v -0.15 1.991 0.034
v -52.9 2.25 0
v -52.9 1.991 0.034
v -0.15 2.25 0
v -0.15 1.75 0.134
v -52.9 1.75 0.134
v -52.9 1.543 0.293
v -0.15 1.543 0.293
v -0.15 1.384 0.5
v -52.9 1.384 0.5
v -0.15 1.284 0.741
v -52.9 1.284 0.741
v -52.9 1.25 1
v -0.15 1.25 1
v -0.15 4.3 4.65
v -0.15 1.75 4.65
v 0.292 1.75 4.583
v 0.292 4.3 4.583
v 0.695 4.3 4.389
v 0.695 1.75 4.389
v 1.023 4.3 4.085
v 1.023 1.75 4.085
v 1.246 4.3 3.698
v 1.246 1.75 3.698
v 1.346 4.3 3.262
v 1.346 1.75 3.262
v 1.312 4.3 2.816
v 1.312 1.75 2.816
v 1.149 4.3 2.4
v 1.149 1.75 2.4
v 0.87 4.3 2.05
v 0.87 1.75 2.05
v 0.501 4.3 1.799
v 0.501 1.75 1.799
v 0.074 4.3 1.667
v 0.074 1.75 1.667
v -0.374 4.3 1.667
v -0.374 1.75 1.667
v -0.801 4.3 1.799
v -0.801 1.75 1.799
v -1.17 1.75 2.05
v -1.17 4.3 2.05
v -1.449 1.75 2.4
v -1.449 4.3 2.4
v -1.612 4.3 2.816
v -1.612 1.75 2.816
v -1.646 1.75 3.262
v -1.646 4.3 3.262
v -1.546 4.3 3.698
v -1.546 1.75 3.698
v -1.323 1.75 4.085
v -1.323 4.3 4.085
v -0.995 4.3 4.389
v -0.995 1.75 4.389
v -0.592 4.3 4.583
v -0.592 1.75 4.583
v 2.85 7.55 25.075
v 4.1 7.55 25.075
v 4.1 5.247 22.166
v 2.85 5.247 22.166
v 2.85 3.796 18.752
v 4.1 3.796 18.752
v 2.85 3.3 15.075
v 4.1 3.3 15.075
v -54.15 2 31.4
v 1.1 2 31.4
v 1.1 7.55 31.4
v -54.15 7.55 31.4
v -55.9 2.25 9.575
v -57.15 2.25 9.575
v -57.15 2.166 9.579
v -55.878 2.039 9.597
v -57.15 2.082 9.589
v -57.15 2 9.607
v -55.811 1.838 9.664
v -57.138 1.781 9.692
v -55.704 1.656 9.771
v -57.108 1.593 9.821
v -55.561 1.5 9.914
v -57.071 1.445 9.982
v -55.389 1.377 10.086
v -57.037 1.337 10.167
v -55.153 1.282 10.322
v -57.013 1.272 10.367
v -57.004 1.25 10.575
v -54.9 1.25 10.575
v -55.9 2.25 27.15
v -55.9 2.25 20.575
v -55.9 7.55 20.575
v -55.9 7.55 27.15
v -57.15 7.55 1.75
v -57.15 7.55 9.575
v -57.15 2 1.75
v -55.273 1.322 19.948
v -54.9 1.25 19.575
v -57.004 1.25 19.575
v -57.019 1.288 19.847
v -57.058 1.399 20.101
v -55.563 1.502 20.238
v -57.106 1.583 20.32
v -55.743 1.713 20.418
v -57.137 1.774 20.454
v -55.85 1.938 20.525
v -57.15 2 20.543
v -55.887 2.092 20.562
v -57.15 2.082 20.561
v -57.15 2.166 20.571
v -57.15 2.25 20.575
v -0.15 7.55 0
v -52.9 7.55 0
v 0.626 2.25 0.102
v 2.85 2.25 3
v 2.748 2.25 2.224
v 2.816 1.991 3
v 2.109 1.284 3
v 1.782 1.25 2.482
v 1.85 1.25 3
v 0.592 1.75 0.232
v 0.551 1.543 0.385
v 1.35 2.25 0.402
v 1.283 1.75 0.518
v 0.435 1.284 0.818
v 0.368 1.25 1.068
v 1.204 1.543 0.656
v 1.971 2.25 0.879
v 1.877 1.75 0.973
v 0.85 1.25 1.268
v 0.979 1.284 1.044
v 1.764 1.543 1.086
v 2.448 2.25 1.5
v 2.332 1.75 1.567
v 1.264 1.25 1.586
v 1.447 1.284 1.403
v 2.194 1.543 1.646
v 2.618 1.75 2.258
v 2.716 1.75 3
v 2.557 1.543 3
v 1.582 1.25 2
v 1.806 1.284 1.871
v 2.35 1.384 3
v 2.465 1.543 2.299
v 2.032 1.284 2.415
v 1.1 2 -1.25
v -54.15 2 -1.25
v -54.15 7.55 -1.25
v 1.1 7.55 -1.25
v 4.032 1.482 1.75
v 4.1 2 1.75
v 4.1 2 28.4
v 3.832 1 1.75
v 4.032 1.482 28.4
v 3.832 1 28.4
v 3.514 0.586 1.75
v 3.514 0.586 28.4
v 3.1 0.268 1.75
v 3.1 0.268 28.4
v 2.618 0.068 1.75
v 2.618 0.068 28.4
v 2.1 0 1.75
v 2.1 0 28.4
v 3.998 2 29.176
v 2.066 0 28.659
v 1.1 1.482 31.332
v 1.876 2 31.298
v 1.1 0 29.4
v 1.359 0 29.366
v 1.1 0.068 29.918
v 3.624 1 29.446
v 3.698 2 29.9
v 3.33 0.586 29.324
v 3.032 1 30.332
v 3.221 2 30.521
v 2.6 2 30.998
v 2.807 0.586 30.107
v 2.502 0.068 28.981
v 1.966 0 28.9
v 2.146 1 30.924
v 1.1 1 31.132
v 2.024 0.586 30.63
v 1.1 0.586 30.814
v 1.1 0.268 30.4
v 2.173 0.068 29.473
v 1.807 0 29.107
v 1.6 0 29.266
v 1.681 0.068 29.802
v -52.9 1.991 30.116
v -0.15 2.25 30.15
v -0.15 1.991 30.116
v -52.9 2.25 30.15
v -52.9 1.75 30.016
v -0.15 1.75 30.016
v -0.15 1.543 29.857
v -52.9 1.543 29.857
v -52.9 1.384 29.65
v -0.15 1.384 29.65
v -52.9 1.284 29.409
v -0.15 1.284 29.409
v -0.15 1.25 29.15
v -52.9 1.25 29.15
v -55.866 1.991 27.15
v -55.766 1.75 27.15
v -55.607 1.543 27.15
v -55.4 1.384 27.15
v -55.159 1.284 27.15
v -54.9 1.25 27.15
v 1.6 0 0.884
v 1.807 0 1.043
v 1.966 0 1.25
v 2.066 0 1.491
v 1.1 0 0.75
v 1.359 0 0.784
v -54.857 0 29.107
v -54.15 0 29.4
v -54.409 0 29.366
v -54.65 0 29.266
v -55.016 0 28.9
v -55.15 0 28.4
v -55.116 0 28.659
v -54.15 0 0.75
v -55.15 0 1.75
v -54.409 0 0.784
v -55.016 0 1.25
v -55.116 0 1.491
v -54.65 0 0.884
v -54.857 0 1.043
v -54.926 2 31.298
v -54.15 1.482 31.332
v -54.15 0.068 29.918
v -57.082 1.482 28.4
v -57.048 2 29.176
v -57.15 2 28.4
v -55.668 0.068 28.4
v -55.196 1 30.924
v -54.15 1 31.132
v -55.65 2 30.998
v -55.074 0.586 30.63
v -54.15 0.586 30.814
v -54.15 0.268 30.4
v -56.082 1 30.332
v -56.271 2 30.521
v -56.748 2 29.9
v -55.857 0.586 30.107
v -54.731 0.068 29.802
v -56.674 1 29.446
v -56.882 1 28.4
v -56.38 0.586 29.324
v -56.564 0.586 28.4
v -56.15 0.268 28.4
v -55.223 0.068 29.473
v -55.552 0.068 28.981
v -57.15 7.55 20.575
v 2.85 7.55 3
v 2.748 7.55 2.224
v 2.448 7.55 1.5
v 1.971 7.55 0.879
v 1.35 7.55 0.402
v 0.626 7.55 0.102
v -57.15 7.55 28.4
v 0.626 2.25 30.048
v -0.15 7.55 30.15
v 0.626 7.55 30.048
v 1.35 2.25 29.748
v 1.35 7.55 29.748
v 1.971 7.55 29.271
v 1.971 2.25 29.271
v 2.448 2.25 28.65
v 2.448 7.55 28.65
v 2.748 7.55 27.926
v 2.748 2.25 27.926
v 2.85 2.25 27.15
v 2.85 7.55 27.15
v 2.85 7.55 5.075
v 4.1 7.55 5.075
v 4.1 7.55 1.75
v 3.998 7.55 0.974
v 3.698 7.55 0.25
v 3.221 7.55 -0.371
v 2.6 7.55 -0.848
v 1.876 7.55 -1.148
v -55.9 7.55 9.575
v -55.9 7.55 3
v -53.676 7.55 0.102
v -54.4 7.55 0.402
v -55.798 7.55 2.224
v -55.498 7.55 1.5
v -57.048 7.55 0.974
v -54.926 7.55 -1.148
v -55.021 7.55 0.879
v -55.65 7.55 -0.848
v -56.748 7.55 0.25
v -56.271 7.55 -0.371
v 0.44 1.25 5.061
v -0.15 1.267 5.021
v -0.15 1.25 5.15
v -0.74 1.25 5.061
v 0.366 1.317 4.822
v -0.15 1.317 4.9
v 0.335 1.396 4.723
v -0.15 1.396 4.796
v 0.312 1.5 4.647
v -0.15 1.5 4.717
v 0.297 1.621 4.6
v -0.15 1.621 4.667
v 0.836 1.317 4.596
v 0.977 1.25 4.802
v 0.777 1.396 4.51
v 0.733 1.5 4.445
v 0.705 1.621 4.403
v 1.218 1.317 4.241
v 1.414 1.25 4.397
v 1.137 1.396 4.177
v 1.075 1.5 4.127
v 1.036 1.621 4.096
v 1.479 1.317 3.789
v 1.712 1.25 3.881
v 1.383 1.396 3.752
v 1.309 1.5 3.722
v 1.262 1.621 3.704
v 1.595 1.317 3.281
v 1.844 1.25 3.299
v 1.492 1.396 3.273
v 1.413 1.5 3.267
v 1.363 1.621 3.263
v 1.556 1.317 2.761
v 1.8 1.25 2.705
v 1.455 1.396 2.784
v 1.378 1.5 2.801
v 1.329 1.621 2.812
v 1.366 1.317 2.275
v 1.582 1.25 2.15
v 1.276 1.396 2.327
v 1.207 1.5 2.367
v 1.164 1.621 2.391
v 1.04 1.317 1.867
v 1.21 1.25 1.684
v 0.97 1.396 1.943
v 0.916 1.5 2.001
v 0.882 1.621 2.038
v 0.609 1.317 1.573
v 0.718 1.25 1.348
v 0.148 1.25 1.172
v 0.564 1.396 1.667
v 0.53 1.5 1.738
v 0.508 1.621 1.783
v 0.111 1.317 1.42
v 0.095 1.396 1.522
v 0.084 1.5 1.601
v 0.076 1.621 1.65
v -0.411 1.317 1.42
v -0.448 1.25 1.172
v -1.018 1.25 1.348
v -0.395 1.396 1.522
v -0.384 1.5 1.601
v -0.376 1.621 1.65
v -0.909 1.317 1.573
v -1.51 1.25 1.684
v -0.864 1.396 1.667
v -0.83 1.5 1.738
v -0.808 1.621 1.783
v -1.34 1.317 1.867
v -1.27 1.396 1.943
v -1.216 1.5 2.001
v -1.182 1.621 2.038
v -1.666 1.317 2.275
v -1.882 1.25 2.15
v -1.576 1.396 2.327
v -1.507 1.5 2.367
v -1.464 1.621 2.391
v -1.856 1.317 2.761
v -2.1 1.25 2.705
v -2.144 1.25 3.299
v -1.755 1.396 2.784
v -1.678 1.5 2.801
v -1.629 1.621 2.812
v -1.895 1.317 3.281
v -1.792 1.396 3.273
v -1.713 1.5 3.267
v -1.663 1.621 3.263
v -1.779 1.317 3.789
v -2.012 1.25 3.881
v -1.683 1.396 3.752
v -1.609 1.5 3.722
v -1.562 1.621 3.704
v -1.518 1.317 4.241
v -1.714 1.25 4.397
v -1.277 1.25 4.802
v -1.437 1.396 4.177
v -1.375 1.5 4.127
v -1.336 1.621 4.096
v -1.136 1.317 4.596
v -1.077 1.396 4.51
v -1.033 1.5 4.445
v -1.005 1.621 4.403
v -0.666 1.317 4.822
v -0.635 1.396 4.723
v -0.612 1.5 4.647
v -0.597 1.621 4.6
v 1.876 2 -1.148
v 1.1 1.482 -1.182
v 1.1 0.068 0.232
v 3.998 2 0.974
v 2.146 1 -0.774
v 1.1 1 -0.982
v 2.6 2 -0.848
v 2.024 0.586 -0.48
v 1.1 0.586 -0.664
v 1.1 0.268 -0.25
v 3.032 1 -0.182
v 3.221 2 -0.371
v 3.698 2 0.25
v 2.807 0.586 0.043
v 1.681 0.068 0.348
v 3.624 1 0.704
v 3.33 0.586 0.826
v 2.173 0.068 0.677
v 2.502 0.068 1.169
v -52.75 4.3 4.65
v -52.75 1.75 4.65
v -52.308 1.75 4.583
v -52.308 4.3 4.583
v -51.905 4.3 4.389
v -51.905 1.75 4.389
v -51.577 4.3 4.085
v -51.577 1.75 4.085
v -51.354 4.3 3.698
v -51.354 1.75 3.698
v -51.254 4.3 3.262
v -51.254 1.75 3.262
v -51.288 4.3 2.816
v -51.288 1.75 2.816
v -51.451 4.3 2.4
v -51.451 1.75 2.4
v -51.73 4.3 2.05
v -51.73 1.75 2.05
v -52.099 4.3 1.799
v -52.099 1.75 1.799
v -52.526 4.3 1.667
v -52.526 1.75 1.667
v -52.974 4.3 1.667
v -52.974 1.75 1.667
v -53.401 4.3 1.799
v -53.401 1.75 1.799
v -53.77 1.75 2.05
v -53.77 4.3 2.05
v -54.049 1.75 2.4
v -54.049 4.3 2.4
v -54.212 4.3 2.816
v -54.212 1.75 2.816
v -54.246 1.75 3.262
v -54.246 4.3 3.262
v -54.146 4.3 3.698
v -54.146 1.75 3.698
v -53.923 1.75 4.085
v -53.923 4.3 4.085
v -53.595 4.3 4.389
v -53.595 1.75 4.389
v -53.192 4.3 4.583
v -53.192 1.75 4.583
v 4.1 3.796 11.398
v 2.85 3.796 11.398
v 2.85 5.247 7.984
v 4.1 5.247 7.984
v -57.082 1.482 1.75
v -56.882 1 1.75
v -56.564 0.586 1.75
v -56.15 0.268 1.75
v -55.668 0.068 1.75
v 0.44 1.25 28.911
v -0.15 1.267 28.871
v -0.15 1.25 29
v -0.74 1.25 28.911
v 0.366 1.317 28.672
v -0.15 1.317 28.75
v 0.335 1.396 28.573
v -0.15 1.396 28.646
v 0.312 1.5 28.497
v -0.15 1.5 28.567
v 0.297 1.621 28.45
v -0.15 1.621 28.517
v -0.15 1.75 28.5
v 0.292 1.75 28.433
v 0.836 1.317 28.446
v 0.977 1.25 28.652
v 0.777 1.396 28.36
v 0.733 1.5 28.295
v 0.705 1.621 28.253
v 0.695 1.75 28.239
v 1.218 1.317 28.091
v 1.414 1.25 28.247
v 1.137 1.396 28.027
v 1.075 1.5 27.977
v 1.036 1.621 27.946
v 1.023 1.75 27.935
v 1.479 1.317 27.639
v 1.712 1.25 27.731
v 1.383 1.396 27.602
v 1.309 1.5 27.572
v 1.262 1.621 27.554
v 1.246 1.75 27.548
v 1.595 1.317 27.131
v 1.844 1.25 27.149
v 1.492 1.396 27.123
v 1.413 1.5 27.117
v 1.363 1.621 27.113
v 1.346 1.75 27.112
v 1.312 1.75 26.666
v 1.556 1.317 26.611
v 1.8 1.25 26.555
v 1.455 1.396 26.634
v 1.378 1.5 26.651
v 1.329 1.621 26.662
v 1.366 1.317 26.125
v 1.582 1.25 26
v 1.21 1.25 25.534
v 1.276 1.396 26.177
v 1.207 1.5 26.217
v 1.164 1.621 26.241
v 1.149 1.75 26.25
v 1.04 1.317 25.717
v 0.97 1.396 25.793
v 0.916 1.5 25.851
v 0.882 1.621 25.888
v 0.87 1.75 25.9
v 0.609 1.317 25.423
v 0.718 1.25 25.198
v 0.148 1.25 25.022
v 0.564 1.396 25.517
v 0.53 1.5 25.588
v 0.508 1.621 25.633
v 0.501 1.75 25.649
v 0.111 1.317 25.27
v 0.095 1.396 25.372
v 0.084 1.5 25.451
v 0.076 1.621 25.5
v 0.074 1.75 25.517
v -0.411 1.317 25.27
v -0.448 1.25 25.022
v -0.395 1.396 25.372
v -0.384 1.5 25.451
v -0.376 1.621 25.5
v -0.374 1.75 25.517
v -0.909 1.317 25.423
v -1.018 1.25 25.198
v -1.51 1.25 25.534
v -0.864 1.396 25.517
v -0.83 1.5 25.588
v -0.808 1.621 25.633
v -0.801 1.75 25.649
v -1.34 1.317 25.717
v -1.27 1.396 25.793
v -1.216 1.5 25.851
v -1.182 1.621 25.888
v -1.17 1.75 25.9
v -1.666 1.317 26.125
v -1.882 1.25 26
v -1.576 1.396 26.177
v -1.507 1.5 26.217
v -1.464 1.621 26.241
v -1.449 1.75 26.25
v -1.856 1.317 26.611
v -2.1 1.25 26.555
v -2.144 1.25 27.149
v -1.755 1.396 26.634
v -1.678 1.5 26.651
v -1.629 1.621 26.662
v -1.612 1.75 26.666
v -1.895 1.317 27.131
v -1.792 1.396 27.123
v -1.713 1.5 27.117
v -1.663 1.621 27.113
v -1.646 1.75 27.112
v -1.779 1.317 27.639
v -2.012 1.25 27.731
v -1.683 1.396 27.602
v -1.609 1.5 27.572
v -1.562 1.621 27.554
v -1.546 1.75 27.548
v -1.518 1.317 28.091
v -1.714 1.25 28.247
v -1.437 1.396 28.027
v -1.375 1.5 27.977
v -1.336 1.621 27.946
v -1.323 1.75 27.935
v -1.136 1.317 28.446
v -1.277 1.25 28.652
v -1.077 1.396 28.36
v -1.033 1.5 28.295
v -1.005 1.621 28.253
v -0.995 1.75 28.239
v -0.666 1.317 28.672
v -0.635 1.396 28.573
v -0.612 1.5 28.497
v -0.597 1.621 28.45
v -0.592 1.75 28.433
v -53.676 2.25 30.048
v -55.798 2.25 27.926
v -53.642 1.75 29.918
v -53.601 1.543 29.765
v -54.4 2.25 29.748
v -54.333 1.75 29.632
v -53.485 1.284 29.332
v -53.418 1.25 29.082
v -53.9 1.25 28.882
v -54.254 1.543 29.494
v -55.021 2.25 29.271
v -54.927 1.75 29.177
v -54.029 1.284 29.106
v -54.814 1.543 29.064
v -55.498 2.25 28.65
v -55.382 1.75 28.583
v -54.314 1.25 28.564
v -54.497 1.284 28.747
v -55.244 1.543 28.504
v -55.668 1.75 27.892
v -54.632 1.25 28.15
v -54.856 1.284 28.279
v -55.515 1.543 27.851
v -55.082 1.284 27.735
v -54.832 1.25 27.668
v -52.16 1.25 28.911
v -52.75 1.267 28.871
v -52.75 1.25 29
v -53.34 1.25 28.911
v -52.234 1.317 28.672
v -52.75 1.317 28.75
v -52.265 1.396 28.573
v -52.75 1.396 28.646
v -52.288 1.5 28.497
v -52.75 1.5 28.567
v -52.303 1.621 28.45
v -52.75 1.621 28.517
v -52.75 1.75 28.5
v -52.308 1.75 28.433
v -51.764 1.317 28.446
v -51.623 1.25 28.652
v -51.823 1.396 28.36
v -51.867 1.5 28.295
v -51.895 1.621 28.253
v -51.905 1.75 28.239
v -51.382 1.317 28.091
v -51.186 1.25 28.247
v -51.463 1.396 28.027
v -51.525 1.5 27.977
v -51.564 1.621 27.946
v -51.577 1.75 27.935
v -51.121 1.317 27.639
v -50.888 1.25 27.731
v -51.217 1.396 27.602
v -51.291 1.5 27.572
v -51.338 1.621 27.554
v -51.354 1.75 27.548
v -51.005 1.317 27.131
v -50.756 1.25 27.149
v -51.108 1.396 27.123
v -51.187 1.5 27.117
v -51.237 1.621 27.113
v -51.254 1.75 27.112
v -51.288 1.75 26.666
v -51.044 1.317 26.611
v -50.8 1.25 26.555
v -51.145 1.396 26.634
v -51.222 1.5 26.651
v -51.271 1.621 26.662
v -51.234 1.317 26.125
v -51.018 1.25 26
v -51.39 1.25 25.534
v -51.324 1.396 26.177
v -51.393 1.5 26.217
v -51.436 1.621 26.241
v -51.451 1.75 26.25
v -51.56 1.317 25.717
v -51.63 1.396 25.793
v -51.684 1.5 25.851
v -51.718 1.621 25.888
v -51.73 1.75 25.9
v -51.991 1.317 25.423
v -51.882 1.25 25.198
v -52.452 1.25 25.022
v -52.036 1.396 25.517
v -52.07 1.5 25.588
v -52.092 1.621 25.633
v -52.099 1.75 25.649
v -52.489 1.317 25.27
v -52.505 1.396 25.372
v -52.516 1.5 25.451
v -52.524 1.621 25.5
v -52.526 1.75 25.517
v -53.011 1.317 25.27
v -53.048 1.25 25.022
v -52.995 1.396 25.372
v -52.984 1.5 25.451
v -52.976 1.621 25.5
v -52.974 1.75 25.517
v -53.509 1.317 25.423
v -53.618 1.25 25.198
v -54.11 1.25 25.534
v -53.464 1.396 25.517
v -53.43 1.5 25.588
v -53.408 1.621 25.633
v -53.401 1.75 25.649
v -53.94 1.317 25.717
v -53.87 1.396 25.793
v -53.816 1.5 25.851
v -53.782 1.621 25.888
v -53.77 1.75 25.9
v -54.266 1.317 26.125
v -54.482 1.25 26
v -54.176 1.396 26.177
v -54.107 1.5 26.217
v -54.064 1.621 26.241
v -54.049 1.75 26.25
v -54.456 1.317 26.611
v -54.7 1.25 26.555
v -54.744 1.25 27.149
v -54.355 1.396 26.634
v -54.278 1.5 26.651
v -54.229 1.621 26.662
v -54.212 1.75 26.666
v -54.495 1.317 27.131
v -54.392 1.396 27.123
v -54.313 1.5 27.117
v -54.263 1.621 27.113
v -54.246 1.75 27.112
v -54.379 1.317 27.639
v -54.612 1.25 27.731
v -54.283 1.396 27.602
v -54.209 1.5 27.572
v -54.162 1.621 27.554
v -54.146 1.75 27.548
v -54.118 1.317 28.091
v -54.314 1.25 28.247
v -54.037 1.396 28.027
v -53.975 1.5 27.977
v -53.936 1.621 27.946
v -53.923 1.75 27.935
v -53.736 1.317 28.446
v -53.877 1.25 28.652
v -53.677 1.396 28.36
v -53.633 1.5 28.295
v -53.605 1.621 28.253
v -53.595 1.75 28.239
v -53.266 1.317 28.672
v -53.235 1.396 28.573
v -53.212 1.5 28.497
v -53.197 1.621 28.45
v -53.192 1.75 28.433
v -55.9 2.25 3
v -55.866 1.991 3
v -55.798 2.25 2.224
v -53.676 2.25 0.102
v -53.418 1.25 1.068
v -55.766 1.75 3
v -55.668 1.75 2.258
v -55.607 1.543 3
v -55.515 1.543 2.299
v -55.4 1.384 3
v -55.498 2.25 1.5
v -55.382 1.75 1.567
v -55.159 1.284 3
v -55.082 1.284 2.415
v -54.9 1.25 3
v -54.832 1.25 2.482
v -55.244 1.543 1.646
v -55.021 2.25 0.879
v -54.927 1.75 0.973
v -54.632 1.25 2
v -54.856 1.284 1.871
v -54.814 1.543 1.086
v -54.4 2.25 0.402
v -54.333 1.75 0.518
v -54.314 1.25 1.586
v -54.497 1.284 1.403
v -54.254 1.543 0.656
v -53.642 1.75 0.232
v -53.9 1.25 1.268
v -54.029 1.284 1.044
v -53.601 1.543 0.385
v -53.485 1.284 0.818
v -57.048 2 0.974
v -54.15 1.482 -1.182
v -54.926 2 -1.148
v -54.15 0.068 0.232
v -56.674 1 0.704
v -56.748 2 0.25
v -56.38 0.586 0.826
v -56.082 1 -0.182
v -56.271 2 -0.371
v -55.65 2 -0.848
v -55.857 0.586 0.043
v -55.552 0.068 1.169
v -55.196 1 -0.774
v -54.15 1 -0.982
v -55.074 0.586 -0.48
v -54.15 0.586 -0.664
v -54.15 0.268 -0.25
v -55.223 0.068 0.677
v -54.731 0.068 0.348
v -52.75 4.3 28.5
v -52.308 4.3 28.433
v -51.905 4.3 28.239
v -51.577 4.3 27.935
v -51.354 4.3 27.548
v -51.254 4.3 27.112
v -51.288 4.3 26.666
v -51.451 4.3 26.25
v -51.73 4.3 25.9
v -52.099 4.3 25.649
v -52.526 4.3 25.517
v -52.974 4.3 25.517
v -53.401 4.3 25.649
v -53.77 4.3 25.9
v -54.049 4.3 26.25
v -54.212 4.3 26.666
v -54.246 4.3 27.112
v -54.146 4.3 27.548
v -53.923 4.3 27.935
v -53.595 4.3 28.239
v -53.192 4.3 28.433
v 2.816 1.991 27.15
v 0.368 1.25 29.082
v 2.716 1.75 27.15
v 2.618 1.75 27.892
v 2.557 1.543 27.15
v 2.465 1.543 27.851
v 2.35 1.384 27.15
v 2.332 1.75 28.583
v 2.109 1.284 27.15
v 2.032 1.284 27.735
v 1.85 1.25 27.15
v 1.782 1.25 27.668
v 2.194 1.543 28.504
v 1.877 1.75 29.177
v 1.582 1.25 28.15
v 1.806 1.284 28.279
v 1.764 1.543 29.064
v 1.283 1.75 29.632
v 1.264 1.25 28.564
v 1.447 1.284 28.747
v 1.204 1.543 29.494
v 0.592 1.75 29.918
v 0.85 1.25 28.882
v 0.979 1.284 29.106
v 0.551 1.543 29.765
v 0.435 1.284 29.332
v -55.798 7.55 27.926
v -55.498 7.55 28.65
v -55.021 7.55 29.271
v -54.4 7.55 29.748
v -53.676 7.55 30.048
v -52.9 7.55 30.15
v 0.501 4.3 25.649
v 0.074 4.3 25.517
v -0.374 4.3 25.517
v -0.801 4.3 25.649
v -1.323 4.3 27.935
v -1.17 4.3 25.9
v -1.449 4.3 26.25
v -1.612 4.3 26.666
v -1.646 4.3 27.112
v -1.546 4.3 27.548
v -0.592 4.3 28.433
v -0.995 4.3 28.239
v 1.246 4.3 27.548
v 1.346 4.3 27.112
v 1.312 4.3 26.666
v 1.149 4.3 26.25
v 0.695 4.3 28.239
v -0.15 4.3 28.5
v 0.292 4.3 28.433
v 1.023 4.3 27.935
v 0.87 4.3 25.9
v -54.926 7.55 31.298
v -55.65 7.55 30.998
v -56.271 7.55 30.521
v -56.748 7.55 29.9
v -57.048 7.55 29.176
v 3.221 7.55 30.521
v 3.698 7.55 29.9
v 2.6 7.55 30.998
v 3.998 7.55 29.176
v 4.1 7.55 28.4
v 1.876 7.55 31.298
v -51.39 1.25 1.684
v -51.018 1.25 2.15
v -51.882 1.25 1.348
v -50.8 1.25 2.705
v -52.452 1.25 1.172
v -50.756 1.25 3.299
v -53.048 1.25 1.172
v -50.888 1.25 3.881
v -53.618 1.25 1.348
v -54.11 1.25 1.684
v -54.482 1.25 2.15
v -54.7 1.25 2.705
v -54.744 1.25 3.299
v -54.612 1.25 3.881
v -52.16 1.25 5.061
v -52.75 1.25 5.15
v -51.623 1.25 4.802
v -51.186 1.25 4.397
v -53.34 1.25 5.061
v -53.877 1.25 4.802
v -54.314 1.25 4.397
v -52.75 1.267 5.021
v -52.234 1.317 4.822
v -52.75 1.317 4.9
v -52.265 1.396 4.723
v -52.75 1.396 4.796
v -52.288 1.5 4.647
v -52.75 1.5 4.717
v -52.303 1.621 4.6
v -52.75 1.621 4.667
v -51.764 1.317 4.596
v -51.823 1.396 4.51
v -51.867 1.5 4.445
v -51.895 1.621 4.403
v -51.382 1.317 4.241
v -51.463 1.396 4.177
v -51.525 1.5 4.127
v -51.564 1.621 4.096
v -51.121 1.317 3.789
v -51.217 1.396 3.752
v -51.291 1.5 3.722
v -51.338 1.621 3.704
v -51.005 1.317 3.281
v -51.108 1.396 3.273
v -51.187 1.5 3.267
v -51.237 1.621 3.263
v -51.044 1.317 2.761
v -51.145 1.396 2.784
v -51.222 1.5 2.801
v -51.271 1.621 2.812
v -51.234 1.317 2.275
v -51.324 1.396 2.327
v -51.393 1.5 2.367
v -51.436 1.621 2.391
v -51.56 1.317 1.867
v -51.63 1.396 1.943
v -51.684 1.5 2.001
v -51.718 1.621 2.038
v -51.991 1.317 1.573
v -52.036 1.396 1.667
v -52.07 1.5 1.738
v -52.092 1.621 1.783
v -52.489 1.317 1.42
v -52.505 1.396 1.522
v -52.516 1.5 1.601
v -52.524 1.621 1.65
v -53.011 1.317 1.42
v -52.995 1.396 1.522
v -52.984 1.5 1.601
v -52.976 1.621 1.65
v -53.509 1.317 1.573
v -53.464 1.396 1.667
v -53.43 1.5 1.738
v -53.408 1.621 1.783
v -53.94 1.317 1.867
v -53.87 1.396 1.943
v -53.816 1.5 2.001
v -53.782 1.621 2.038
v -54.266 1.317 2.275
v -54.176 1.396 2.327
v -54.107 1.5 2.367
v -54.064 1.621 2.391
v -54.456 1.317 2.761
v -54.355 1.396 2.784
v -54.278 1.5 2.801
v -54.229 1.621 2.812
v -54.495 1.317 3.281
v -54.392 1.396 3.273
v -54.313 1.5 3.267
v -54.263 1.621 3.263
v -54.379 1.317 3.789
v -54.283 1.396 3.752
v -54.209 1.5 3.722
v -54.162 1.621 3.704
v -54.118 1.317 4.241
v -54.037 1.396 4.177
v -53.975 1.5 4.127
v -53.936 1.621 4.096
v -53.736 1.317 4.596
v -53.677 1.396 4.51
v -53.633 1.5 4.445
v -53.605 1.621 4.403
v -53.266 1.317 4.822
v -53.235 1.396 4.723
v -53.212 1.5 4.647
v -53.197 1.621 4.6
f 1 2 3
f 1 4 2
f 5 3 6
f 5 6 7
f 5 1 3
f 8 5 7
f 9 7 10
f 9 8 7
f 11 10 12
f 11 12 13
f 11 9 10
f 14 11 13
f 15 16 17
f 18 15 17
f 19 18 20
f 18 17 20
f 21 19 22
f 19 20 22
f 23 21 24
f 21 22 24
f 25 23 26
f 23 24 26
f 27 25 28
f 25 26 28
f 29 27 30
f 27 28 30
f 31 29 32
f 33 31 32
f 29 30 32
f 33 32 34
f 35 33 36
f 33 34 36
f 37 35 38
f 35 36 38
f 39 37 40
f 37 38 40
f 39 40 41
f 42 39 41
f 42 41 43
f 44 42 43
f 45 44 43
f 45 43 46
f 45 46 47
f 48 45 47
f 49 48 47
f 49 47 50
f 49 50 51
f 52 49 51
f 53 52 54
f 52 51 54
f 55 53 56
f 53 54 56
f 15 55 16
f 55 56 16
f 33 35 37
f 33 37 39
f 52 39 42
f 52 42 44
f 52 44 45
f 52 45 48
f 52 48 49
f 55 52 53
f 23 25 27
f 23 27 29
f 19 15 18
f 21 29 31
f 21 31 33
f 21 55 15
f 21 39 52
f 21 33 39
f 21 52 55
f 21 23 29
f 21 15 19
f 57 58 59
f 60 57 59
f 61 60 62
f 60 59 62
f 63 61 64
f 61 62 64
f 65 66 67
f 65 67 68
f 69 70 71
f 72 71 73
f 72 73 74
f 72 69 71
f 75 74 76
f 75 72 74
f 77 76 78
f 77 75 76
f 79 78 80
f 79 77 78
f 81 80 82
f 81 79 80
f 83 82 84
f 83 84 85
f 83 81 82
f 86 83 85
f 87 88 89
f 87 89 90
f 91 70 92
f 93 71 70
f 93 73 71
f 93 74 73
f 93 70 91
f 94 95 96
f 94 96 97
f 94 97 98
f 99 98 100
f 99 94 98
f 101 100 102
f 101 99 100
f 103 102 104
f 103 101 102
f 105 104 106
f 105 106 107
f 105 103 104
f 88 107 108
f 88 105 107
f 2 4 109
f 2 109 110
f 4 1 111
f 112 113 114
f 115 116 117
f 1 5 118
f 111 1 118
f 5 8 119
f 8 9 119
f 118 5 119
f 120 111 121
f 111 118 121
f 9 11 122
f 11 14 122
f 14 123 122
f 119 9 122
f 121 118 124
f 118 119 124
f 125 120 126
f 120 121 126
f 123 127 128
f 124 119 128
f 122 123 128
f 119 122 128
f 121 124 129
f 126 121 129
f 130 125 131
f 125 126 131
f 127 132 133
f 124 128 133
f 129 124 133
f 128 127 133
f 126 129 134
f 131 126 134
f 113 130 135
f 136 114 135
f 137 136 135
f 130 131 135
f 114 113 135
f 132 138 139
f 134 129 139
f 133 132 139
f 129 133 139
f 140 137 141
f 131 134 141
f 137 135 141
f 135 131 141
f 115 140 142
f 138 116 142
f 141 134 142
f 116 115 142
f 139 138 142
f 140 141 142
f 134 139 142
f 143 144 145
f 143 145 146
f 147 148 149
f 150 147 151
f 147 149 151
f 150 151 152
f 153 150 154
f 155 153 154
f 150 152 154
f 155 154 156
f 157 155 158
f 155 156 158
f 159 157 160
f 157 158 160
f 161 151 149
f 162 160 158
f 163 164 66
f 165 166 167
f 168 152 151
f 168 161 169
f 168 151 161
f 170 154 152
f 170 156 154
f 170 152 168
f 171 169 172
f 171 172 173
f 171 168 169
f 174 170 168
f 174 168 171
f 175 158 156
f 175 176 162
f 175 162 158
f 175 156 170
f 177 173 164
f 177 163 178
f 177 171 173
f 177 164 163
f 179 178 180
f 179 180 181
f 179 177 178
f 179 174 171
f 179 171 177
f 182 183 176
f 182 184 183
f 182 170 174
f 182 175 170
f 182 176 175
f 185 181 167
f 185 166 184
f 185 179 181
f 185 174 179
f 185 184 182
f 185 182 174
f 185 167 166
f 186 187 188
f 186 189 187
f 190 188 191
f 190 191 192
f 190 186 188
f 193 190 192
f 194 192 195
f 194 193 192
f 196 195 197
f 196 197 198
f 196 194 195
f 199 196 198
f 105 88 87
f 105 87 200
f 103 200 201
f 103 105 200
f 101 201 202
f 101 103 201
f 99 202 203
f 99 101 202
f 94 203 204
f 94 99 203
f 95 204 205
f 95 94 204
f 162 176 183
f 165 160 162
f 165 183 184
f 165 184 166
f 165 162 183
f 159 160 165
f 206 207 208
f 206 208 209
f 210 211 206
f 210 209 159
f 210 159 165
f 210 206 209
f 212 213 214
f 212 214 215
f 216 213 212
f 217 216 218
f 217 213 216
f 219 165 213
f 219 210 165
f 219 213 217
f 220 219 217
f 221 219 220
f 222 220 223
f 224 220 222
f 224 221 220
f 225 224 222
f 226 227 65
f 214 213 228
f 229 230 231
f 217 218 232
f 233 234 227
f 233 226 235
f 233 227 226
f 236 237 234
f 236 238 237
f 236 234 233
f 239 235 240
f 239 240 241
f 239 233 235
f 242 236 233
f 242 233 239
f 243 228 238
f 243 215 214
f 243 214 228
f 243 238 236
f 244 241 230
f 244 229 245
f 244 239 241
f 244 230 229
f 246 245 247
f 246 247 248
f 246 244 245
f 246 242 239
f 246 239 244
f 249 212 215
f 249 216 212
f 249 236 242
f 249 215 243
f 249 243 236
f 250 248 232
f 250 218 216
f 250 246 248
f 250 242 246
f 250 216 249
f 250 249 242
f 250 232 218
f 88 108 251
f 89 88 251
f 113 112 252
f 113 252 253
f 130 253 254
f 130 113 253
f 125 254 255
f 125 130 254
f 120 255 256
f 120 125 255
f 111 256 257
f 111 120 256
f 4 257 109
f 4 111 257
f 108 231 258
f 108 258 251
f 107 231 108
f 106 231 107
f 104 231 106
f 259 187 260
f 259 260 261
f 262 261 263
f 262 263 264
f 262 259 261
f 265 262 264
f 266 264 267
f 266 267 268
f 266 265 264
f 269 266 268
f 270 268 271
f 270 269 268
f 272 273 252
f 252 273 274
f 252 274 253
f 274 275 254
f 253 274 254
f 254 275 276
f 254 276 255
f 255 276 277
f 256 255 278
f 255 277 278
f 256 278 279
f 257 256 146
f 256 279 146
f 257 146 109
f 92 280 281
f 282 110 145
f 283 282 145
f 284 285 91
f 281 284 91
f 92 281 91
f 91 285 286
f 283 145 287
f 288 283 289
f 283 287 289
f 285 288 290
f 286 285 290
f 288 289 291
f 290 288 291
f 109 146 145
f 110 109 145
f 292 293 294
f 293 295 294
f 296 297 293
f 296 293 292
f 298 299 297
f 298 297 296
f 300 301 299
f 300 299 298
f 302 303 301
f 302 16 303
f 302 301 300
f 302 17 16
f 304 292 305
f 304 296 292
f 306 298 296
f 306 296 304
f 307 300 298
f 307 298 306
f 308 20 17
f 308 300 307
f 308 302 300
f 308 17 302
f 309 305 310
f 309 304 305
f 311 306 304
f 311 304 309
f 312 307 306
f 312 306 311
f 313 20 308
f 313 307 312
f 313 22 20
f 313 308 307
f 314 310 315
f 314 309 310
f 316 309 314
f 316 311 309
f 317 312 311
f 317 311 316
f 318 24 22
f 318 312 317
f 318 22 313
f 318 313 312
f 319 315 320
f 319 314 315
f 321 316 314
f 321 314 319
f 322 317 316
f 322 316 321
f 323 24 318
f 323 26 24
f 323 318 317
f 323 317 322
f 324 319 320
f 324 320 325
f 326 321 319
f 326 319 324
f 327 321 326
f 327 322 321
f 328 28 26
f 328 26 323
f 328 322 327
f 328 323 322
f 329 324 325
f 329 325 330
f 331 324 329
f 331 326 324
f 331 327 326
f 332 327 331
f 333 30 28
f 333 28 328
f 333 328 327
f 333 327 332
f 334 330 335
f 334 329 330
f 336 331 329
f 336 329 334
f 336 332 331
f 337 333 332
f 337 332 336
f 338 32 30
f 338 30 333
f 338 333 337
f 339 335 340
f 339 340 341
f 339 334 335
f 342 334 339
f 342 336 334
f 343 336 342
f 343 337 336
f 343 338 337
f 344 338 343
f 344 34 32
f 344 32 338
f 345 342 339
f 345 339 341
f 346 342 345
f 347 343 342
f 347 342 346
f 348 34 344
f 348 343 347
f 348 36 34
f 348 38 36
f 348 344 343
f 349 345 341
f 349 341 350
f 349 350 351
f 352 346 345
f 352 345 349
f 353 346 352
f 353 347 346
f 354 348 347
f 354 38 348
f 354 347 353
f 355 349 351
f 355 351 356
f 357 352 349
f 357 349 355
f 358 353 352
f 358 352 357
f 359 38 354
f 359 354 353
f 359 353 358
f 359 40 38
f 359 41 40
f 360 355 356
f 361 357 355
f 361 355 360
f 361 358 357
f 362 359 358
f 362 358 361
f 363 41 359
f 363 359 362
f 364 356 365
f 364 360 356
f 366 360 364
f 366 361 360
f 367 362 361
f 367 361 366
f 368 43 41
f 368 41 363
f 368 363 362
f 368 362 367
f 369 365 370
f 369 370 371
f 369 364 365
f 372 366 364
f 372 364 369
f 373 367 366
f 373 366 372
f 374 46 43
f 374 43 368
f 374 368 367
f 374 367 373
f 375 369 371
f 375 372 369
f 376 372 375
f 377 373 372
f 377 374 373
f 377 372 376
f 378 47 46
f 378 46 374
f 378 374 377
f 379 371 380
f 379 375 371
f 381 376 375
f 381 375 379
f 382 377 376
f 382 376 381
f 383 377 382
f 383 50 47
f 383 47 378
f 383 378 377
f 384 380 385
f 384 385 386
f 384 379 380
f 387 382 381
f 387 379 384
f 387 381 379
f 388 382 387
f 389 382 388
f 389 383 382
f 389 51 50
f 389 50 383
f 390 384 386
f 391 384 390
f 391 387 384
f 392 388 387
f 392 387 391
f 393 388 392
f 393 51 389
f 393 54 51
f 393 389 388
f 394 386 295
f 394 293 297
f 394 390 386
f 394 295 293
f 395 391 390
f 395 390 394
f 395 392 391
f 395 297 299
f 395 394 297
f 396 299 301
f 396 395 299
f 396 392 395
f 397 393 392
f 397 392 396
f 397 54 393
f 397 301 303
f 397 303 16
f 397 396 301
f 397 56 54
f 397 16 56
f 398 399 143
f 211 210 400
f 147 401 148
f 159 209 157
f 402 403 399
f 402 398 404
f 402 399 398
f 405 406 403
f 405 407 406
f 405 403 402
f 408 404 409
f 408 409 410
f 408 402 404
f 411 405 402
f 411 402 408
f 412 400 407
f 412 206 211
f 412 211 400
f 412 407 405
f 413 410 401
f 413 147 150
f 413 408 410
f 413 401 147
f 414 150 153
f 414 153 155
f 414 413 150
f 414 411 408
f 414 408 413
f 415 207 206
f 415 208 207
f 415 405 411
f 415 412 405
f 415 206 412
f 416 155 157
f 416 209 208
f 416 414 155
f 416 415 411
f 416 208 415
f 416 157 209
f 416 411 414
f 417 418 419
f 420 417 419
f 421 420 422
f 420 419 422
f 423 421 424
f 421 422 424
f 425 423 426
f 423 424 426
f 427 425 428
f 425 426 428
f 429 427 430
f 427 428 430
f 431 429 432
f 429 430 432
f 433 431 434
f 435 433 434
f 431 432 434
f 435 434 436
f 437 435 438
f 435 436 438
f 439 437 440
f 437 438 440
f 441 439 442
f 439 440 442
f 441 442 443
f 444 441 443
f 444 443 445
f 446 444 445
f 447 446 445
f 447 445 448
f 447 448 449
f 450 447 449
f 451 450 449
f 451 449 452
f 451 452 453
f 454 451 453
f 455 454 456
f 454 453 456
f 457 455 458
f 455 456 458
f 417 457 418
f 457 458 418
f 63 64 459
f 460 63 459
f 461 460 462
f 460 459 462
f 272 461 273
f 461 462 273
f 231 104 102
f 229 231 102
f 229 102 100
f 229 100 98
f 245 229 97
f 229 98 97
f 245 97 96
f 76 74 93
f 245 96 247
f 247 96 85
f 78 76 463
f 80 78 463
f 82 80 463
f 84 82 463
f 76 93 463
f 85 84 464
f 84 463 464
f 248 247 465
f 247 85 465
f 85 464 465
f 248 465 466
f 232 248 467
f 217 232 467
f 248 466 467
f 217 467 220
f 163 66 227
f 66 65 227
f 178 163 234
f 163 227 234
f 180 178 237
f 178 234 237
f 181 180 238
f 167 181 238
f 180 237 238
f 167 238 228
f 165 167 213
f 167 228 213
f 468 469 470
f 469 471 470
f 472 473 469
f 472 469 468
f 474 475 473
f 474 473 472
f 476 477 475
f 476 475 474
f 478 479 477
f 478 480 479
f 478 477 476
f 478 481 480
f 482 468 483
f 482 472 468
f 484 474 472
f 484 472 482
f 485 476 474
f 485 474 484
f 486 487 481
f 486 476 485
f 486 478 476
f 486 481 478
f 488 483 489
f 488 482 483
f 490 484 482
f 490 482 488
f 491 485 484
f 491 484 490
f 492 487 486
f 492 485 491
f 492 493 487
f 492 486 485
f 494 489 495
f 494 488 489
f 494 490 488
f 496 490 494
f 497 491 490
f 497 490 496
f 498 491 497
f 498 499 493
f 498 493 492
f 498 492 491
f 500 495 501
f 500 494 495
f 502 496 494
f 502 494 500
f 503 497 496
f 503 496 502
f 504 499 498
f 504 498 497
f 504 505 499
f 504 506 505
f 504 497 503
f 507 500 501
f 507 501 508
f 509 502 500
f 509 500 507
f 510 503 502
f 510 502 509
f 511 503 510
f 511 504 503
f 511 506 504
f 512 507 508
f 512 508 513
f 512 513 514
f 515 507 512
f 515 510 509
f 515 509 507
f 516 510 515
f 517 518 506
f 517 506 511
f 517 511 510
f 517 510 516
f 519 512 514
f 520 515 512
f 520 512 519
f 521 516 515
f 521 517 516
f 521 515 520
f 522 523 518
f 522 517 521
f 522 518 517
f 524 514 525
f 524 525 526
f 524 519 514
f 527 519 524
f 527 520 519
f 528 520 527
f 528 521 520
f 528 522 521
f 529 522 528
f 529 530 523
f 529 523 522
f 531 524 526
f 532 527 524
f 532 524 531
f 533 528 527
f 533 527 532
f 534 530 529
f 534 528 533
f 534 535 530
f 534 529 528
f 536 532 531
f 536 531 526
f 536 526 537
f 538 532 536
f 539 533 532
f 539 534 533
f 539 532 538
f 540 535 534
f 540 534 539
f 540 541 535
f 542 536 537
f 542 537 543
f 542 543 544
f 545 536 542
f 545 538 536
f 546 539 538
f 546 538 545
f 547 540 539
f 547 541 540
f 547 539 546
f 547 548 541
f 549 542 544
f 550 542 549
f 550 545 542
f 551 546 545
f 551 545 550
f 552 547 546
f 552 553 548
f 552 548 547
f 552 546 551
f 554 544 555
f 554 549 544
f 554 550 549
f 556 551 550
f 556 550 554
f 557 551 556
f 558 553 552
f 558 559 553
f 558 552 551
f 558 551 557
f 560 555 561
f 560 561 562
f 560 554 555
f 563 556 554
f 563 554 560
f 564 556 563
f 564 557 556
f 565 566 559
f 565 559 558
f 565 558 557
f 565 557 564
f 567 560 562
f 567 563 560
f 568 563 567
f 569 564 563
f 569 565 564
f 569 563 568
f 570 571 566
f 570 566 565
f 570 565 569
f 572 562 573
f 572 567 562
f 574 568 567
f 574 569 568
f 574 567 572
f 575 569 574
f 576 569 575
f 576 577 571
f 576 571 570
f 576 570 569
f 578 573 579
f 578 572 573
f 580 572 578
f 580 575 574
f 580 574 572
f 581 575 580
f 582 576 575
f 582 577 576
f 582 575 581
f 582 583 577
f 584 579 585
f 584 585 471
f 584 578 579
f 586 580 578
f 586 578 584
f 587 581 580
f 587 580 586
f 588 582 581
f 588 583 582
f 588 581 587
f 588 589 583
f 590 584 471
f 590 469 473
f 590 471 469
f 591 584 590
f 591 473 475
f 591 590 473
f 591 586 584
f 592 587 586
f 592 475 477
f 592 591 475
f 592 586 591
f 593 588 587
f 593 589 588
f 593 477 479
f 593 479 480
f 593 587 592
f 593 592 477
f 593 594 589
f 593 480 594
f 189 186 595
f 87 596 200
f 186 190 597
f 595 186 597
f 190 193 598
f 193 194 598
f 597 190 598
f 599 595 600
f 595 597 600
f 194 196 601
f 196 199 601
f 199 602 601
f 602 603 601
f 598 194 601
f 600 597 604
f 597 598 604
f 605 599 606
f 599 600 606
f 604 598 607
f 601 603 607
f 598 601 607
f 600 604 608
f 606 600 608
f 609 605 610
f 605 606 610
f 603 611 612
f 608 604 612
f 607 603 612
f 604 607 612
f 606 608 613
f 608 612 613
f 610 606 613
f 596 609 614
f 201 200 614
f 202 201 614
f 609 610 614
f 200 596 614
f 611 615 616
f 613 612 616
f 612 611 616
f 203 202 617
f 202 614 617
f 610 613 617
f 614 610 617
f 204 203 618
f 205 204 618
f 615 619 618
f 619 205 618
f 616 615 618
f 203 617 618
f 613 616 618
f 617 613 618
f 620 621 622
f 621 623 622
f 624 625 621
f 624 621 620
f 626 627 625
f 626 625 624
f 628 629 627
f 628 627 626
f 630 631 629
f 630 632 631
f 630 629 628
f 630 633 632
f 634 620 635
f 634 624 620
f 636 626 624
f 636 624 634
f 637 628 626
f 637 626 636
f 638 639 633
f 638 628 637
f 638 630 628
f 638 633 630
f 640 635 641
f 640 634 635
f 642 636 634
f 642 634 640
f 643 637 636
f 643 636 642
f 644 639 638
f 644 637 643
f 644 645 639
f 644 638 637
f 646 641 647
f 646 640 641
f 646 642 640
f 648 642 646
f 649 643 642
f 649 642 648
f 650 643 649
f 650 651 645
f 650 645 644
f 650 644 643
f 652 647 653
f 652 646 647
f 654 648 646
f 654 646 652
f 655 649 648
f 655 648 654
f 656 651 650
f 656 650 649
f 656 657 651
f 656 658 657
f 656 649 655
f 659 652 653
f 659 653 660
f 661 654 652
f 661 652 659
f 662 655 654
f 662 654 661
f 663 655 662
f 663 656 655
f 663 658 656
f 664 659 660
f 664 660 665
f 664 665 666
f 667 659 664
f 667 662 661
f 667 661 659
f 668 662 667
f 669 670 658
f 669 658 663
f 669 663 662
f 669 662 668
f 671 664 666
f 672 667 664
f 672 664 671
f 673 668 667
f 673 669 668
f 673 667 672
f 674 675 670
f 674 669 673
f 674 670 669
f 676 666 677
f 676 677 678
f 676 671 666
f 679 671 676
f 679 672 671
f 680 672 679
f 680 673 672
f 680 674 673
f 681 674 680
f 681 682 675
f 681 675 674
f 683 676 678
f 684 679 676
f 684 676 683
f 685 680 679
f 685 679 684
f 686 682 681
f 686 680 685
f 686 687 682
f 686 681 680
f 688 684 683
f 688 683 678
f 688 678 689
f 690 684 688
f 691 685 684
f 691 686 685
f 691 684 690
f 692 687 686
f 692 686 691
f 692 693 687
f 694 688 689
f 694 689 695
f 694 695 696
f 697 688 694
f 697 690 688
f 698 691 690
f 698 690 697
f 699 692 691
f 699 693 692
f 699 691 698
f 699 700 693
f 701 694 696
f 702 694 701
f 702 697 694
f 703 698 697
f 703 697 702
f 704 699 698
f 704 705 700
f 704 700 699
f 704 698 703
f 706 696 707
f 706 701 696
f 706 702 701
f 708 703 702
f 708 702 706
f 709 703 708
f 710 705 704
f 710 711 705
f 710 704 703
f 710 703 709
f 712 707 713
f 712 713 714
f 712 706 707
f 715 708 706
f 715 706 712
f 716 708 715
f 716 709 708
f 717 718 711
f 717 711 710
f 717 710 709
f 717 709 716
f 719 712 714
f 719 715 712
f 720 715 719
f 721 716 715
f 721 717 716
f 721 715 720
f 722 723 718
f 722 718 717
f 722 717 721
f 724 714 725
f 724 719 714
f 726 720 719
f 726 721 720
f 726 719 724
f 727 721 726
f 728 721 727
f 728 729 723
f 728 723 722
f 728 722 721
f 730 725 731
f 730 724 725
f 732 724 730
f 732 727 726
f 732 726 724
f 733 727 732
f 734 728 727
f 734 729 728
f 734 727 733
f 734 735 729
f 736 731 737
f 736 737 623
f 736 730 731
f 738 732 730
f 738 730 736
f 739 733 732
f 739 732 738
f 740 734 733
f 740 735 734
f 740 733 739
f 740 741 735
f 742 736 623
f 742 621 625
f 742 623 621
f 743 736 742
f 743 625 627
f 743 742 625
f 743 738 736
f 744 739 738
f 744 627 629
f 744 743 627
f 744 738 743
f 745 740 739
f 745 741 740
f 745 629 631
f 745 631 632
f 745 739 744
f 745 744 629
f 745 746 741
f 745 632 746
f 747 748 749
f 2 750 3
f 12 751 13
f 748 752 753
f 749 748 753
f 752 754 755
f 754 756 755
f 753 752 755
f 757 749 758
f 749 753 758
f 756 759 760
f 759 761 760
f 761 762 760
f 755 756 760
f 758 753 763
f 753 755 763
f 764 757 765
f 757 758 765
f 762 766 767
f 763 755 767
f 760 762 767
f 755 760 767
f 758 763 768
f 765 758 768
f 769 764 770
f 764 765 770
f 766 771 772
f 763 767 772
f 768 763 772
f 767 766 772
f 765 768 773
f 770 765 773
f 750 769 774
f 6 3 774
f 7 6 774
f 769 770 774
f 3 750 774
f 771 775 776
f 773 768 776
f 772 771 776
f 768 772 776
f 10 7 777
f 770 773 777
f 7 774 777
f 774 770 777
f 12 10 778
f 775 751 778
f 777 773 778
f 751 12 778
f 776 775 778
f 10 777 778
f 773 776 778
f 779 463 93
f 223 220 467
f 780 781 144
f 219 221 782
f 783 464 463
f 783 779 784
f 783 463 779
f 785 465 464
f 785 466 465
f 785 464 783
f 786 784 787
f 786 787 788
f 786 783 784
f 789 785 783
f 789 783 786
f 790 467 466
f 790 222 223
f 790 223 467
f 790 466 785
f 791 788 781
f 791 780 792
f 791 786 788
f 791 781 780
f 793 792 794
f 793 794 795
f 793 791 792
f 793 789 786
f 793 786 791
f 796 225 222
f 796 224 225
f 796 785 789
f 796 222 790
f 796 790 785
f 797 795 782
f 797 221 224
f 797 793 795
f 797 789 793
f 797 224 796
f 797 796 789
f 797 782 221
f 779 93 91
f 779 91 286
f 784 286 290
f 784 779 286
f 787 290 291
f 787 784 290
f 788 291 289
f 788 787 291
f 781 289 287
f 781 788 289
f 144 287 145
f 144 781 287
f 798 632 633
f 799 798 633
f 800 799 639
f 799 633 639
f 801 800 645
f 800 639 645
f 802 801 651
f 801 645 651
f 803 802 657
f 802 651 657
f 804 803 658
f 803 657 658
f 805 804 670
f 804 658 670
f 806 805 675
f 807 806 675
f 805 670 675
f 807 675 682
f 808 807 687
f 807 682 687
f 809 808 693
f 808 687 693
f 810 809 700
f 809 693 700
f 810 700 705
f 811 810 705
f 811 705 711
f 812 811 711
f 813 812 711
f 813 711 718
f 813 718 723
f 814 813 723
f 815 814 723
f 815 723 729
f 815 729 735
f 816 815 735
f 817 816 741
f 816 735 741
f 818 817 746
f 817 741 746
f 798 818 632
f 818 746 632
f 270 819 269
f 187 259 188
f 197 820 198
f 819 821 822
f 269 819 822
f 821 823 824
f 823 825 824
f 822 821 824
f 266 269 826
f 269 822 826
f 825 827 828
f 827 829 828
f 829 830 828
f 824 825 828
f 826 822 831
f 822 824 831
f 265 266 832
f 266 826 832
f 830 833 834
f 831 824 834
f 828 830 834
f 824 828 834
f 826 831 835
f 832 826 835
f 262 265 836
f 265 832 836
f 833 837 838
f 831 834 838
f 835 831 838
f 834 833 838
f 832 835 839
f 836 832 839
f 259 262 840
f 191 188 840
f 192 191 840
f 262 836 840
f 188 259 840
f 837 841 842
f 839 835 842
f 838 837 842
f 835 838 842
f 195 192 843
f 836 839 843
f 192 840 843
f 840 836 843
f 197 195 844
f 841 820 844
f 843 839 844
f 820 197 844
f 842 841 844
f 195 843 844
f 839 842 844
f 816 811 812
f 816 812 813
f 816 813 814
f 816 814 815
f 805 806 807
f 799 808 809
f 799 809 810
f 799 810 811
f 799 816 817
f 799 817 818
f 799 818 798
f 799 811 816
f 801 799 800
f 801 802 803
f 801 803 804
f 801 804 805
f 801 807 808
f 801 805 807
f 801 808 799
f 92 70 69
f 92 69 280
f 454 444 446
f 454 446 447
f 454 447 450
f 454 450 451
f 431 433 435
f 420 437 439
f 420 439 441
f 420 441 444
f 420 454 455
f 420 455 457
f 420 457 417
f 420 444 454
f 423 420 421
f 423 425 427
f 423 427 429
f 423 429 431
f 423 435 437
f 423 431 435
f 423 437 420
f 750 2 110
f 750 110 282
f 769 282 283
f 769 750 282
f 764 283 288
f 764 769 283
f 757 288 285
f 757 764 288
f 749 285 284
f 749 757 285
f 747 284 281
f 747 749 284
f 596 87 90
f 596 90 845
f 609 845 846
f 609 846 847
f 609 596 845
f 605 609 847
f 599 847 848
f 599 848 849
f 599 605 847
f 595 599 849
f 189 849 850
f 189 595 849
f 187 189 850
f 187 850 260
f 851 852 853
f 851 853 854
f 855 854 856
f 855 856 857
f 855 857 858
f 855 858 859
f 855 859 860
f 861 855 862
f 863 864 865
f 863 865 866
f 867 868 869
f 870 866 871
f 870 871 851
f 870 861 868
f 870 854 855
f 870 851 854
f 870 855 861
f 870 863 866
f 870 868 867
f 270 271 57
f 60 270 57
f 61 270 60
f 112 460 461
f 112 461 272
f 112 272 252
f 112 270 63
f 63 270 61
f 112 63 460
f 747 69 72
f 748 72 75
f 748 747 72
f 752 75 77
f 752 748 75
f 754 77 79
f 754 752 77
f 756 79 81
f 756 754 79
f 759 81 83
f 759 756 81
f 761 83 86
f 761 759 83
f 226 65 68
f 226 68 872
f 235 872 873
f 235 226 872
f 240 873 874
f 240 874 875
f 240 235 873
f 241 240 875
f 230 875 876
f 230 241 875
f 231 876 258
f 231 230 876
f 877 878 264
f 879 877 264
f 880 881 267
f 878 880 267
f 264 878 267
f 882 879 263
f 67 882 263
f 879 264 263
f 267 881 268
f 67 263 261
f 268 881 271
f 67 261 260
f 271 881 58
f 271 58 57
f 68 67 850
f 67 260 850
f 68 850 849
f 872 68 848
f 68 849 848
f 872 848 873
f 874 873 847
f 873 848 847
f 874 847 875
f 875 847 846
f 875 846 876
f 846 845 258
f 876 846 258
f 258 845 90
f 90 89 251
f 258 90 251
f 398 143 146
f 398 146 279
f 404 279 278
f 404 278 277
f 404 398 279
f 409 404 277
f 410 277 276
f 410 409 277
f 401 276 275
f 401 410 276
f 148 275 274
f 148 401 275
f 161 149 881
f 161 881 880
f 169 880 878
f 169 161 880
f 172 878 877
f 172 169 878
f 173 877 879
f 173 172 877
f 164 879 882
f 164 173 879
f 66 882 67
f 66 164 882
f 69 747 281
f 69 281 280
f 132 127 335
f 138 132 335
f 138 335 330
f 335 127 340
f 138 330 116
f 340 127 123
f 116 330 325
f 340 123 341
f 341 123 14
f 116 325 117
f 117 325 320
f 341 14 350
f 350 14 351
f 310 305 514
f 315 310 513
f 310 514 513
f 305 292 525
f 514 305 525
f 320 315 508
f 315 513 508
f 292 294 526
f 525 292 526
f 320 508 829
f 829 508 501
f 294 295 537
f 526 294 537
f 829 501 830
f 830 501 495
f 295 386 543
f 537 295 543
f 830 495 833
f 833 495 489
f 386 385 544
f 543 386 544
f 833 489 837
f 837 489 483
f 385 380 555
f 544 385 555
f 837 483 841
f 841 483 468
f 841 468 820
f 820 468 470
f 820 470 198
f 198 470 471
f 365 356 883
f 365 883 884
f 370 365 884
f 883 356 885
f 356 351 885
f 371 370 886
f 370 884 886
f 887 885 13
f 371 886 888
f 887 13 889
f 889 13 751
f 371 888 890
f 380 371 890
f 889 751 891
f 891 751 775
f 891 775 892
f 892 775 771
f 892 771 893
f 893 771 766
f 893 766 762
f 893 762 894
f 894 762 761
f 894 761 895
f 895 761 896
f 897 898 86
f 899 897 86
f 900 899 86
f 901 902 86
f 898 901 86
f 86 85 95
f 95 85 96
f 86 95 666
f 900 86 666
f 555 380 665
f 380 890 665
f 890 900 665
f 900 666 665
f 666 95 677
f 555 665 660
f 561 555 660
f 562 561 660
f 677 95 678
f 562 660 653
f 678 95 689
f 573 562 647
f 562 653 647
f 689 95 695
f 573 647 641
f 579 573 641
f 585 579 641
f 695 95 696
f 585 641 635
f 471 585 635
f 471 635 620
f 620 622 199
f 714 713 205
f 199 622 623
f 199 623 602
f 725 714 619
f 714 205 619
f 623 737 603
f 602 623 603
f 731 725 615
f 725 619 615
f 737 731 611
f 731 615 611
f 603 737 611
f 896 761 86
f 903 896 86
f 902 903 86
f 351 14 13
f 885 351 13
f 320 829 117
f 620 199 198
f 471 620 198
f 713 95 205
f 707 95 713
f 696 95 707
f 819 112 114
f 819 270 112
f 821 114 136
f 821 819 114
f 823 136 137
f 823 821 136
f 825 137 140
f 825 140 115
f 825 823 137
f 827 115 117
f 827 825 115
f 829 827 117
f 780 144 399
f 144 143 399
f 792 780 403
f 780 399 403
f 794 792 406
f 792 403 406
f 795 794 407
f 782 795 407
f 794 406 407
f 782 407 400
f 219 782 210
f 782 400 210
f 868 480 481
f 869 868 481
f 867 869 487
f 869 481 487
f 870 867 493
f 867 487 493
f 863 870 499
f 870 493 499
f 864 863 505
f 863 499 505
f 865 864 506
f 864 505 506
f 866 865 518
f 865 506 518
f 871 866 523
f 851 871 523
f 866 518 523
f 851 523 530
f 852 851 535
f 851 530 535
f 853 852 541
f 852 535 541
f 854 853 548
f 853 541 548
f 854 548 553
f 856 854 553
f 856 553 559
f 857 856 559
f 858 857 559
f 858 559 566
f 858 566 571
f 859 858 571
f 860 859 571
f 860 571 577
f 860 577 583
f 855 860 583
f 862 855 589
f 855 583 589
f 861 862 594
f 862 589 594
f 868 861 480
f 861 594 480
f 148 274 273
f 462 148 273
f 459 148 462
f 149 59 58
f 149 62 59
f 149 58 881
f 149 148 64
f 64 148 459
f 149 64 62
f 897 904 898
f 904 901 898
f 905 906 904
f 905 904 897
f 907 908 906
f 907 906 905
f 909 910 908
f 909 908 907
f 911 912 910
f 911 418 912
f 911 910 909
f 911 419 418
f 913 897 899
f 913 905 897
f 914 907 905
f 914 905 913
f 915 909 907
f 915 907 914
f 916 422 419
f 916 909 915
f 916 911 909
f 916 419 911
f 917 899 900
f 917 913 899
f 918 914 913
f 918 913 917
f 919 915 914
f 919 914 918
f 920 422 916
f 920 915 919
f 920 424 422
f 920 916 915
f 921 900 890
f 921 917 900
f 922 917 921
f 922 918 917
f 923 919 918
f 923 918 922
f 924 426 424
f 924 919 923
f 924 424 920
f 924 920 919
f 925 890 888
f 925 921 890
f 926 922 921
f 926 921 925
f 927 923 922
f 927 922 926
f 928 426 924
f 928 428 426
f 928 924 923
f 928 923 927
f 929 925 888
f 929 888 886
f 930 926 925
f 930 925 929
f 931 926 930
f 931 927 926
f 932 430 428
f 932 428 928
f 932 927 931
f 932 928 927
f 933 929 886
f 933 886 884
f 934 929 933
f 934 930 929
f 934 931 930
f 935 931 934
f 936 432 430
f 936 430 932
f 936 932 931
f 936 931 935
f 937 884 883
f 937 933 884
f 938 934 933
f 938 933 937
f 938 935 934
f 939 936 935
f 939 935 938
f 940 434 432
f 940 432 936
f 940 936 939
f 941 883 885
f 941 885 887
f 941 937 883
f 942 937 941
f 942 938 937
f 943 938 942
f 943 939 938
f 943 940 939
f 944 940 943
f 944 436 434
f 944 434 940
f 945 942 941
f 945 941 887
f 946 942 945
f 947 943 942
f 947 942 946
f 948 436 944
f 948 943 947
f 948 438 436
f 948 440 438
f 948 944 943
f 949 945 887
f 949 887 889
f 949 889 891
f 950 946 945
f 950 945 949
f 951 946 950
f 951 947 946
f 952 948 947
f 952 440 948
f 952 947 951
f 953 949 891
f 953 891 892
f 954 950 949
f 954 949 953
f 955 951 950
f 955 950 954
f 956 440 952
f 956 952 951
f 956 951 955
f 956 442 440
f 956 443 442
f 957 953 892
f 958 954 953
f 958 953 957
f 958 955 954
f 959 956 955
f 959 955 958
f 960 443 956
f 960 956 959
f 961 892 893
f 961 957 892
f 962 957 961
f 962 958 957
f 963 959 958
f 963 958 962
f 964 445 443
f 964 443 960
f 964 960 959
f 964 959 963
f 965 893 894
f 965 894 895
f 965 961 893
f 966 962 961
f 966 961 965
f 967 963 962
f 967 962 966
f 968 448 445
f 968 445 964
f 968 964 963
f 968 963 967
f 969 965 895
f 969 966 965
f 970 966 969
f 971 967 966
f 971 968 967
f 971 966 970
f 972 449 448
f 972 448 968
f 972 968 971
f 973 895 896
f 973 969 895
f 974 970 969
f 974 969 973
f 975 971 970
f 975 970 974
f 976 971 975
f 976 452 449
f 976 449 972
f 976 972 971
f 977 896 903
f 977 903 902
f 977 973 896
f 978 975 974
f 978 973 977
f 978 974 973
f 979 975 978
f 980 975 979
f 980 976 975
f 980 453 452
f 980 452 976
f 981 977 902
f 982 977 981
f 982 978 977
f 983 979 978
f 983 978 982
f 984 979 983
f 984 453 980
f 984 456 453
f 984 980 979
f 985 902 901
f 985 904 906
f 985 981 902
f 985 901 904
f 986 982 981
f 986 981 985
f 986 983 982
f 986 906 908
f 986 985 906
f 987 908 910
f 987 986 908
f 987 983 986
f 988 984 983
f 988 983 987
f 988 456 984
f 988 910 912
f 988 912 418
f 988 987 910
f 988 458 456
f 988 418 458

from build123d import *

# Parameters (mm, degrees)
BOSS_EXTRUDE2_DEPTH = 7.55
SKETCH3_W           = 58.75
SKETCH3_H           = 30.15
BOSS_EXTRUDE3_DEPTH = 1.25
SKETCH5_R           = 1.5
BOSS_EXTRUDE4_DEPTH = 3.05
FILLET1_R           = 0.5
FILLET4_R           = 2
SKETCH7_W           = 11
SKETCH7_H           = 6.3
CUT_EXTRUDE1_DEPTH  = 2
FILLET7_R           = 1
CUT_EXTRUDE2_DEPTH  = 2
FILLET8_R           = 1


with BuildPart() as part:
    # Sketch2 → Boss-Extrude2 (new body)
    with BuildSketch(Plane(origin=(0, 0, 0), x_dir=(1, 0, 0), z_dir=(0, 1, 0))):
        with BuildLine():
            Line((-54.15, 1.25), (1.1, 1.25))
            ThreePointArc((1.1, 1.25), (3.221320344, 0.371320344), (4.1, -1.75))
            Line((4.1, -1.75), (4.1, -28.4))
            ThreePointArc((4.1, -28.4), (3.221320344, -30.521320344), (1.1, -31.4))
            Line((1.1, -31.4), (-54.15, -31.4))
            ThreePointArc((-54.15, -31.4), (-56.271320344, -30.521320344), (-57.15, -28.4))
            Line((-57.15, -28.4), (-57.15, -1.75))
            ThreePointArc((-57.15, -1.75), (-56.271320344, 0.371320344), (-54.15, 1.25))
        make_face()
        with BuildLine():
            Line((-52.9, -30.15), (-0.15, -30.15))
            ThreePointArc((-0.15, -30.15), (1.971320344, -29.271320344), (2.85, -27.15))
            Line((2.85, -27.15), (2.85, -3))
            ThreePointArc((2.85, -3), (1.971320344, -0.878679656), (-0.15, 0))
            Line((-0.15, 0), (-52.9, 0))
            ThreePointArc((-52.9, 0), (-55.021320344, -0.878679656), (-55.9, -3))
            Line((-55.9, -3), (-55.9, -27.15))
            ThreePointArc((-55.9, -27.15), (-55.021320344, -29.271320344), (-52.9, -30.15))
        make_face(mode=Mode.SUBTRACT)
    extrude(amount=BOSS_EXTRUDE2_DEPTH)

    # Sketch3 → Boss-Extrude3 (add)
    with BuildSketch(Plane(origin=(0, 0, 0), x_dir=(1, 0, 0), z_dir=(0, 1, 0))):
        with Locations((-26.525, -15.075)):
            Rectangle(SKETCH3_W, SKETCH3_H)
    extrude(amount=BOSS_EXTRUDE3_DEPTH)

    # Sketch5 → Boss-Extrude4 (add)
    with BuildSketch(Plane(origin=(0, 1.25, 0), x_dir=(1, 0, 0), z_dir=(0, 1, 0))):
        with Locations(Location((-52.75, -3.15, 0), (0, 0, 270))):
            Circle(SKETCH5_R)
        with Locations(Location((-0.15, -3.15, 0), (0, 0, 270))):
            Circle(SKETCH5_R)
        with Locations(Location((-0.15, -27, 0), (0, 0, 270))):
            Circle(SKETCH5_R)
        with Locations(Location((-52.75, -27, 0), (0, 0, 270))):
            Circle(SKETCH5_R)
    extrude(amount=BOSS_EXTRUDE4_DEPTH)

    # Fillet1
    fillet1_edges = [part.edges().sort_by_distance(p)[0] for p in [
        (-52.75, 1.25, 25.5),
        (-52.75, 1.25, 1.65),
        (-0.15, 1.25, 1.65),
        (-0.15, 1.25, 25.5),
    ]]
    fillet(fillet1_edges, radius=FILLET1_R)

    # Fillet4
    fillet4_edges = [part.edges().sort_by_distance(p)[0] for p in [
        (4.1, 0, 15.075),
        (3.221320344, 0, 30.521320344),
        (-26.525, 0, 31.4),
        (-56.271320344, 0, 30.521320344),
        (-57.15, 0, 15.075),
        (-56.271320344, 0, -0.371320344),
        (-26.525, 0, -1.25),
        (3.221320344, 0, -0.371320344),
    ]]
    fillet(fillet4_edges, radius=FILLET4_R)

    # Sketch7 → Cut-Extrude1 (cut)
    with BuildSketch(Plane.ZY.offset(57.15)):
        with Locations((15.075, 4.4)):
            Rectangle(SKETCH7_W, SKETCH7_H)
    extrude(amount=-CUT_EXTRUDE1_DEPTH, mode=Mode.SUBTRACT)

    # Fillet7
    fillet7_edges = [part.edges().sort_by_distance(p)[0] for p in [
        (-55.9, 1.25, 23.8625),
        (-55.9, 1.25, 6.2875),
        (-55.021320344, 1.25, 29.271320344),
        (-26.525, 1.25, 30.15),
        (1.971320344, 1.25, 29.271320344),
        (2.85, 1.25, 15.075),
        (1.971320344, 1.25, 0.878679656),
        (-26.525, 1.25, 0),
        (-55.021320344, 1.25, 0.878679656),
    ]]
    fillet(fillet7_edges, radius=FILLET7_R - 0.0001)  # a hair under: the kernel refuses the full size

    # Sketch8 → Cut-Extrude2 (cut)
    with BuildSketch(Plane(origin=(4.1, 0, 0), x_dir=(0, 0, -1), z_dir=(1, 0, 0))):
        with BuildLine():
            Line((-5.075, 7.55), (-15.075, 7.55))
            Line((-15.075, 7.55), (-15.075, 3.3))
            ThreePointArc((-15.075, 3.3), (-9.642171547, 4.406580111), (-5.075, 7.55))
        make_face()
        with BuildLine():
            Line((-15.075, 3.3), (-15.075, 7.55))
            Line((-15.075, 7.55), (-25.075, 7.55))
            ThreePointArc((-25.075, 7.55), (-20.507828453, 4.406580111), (-15.075, 3.3))
        make_face()
    extrude(amount=-CUT_EXTRUDE2_DEPTH, mode=Mode.SUBTRACT)

    # Fillet8
    fillet8_edges = [part.edges().sort_by_distance(p)[0] for p in [
        (-55.952074811, 1.25, 20.575),
        (-55.952074811, 1.25, 9.575),
    ]]
    fillet(fillet8_edges, radius=FILLET8_R - 0.0001)  # a hair under: the kernel refuses the full size


solid = part.part
